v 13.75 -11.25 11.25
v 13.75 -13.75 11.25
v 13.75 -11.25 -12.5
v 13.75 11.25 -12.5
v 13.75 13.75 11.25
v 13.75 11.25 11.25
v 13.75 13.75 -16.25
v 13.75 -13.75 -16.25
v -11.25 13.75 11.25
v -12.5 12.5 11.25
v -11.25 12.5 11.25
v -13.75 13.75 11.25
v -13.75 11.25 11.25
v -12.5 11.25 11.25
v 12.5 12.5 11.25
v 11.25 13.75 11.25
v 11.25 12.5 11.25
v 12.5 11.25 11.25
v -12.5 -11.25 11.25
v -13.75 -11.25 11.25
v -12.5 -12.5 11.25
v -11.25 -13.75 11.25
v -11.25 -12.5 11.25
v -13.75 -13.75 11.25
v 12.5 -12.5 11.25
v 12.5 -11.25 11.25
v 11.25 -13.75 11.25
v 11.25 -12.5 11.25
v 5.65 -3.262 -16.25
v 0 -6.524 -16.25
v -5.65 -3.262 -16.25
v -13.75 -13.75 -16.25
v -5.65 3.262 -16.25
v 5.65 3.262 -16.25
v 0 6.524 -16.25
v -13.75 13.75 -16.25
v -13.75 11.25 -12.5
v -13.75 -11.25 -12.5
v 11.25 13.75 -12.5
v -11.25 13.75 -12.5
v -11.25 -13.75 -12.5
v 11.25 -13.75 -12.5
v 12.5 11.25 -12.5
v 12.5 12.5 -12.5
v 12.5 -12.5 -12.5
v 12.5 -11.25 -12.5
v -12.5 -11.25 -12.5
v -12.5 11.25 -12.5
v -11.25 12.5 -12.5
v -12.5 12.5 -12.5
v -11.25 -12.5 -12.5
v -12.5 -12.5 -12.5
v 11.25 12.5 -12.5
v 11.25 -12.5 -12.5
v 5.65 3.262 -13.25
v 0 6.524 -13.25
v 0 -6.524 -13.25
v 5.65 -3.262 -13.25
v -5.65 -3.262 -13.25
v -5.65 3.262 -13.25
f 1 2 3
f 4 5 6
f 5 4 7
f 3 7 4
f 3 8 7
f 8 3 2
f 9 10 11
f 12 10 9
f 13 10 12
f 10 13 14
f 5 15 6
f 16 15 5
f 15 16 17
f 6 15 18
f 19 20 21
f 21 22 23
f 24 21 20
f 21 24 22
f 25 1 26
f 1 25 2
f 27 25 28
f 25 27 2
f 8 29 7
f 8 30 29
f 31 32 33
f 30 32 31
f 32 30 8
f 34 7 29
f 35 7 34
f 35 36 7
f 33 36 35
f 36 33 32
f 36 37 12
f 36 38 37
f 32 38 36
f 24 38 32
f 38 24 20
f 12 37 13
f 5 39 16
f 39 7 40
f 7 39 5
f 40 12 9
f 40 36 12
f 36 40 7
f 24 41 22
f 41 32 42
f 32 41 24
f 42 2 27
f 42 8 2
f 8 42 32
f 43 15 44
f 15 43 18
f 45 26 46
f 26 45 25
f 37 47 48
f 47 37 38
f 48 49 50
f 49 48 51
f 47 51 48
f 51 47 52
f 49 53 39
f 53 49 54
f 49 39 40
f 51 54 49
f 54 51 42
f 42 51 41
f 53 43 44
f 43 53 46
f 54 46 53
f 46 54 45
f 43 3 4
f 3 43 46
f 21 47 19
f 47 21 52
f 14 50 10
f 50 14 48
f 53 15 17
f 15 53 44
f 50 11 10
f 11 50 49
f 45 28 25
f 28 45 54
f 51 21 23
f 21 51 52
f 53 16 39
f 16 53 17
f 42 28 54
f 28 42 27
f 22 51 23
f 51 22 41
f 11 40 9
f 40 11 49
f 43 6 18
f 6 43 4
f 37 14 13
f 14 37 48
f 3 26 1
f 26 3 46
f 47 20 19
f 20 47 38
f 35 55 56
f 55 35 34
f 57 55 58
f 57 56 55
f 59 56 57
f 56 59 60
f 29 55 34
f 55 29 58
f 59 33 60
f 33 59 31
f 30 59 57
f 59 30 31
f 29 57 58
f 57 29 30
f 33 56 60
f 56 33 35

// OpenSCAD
// file: config.scad
$fn = $preview ? 32 : 128;
thread_fn = $preview ? 16 : 128;

INFTSML = 0.0000000000001;

BEAM_SPLITTER_WIDTH = 25;
HOLDER_THICKNESS = 5;

BOLT_HEX_WIDTH = 8.3;
BOLT_HEX_LENGTH = 20;
BOLT_MOUNT_THICKNESS = 3;
BOLT_MOUNT_CAP = 3;

module hexagon(width) {
	diagonal = width * tan(30) + (width / 2) / cos(30);
	polygon(points = [
		[0, diagonal / 2],
		[width / 2,  width * tan(30) / 2],
		[width / 2, -width * tan(30) / 2],
		[0, -diagonal / 2],
		[-width / 2, -width * tan(30) / 2],
		[-width / 2,  width * tan(30) / 2],
	]);
}
// main file
include <config.scad>

module beam_splitter() {
	color("red") cube(BEAM_SPLITTER_WIDTH, true);
}

module holder() {
	holder_width = BEAM_SPLITTER_WIDTH + HOLDER_THICKNESS / 2;
	
	difference() {
		translate([0, 0, -HOLDER_THICKNESS / 2]) cube(holder_width, true);

		beam_splitter();
		
		cube([BEAM_SPLITTER_WIDTH - HOLDER_THICKNESS / 2, holder_width, BEAM_SPLITTER_WIDTH], true);
		cube([holder_width, BEAM_SPLITTER_WIDTH - HOLDER_THICKNESS / 2, BEAM_SPLITTER_WIDTH], true);

		translate([0, 0, -(holder_width + HOLDER_THICKNESS) / 2]) linear_extrude(BOLT_MOUNT_CAP) hexagon(BOLT_HEX_WIDTH + BOLT_MOUNT_THICKNESS);
	}
}


// beam_splitter();
holder();
